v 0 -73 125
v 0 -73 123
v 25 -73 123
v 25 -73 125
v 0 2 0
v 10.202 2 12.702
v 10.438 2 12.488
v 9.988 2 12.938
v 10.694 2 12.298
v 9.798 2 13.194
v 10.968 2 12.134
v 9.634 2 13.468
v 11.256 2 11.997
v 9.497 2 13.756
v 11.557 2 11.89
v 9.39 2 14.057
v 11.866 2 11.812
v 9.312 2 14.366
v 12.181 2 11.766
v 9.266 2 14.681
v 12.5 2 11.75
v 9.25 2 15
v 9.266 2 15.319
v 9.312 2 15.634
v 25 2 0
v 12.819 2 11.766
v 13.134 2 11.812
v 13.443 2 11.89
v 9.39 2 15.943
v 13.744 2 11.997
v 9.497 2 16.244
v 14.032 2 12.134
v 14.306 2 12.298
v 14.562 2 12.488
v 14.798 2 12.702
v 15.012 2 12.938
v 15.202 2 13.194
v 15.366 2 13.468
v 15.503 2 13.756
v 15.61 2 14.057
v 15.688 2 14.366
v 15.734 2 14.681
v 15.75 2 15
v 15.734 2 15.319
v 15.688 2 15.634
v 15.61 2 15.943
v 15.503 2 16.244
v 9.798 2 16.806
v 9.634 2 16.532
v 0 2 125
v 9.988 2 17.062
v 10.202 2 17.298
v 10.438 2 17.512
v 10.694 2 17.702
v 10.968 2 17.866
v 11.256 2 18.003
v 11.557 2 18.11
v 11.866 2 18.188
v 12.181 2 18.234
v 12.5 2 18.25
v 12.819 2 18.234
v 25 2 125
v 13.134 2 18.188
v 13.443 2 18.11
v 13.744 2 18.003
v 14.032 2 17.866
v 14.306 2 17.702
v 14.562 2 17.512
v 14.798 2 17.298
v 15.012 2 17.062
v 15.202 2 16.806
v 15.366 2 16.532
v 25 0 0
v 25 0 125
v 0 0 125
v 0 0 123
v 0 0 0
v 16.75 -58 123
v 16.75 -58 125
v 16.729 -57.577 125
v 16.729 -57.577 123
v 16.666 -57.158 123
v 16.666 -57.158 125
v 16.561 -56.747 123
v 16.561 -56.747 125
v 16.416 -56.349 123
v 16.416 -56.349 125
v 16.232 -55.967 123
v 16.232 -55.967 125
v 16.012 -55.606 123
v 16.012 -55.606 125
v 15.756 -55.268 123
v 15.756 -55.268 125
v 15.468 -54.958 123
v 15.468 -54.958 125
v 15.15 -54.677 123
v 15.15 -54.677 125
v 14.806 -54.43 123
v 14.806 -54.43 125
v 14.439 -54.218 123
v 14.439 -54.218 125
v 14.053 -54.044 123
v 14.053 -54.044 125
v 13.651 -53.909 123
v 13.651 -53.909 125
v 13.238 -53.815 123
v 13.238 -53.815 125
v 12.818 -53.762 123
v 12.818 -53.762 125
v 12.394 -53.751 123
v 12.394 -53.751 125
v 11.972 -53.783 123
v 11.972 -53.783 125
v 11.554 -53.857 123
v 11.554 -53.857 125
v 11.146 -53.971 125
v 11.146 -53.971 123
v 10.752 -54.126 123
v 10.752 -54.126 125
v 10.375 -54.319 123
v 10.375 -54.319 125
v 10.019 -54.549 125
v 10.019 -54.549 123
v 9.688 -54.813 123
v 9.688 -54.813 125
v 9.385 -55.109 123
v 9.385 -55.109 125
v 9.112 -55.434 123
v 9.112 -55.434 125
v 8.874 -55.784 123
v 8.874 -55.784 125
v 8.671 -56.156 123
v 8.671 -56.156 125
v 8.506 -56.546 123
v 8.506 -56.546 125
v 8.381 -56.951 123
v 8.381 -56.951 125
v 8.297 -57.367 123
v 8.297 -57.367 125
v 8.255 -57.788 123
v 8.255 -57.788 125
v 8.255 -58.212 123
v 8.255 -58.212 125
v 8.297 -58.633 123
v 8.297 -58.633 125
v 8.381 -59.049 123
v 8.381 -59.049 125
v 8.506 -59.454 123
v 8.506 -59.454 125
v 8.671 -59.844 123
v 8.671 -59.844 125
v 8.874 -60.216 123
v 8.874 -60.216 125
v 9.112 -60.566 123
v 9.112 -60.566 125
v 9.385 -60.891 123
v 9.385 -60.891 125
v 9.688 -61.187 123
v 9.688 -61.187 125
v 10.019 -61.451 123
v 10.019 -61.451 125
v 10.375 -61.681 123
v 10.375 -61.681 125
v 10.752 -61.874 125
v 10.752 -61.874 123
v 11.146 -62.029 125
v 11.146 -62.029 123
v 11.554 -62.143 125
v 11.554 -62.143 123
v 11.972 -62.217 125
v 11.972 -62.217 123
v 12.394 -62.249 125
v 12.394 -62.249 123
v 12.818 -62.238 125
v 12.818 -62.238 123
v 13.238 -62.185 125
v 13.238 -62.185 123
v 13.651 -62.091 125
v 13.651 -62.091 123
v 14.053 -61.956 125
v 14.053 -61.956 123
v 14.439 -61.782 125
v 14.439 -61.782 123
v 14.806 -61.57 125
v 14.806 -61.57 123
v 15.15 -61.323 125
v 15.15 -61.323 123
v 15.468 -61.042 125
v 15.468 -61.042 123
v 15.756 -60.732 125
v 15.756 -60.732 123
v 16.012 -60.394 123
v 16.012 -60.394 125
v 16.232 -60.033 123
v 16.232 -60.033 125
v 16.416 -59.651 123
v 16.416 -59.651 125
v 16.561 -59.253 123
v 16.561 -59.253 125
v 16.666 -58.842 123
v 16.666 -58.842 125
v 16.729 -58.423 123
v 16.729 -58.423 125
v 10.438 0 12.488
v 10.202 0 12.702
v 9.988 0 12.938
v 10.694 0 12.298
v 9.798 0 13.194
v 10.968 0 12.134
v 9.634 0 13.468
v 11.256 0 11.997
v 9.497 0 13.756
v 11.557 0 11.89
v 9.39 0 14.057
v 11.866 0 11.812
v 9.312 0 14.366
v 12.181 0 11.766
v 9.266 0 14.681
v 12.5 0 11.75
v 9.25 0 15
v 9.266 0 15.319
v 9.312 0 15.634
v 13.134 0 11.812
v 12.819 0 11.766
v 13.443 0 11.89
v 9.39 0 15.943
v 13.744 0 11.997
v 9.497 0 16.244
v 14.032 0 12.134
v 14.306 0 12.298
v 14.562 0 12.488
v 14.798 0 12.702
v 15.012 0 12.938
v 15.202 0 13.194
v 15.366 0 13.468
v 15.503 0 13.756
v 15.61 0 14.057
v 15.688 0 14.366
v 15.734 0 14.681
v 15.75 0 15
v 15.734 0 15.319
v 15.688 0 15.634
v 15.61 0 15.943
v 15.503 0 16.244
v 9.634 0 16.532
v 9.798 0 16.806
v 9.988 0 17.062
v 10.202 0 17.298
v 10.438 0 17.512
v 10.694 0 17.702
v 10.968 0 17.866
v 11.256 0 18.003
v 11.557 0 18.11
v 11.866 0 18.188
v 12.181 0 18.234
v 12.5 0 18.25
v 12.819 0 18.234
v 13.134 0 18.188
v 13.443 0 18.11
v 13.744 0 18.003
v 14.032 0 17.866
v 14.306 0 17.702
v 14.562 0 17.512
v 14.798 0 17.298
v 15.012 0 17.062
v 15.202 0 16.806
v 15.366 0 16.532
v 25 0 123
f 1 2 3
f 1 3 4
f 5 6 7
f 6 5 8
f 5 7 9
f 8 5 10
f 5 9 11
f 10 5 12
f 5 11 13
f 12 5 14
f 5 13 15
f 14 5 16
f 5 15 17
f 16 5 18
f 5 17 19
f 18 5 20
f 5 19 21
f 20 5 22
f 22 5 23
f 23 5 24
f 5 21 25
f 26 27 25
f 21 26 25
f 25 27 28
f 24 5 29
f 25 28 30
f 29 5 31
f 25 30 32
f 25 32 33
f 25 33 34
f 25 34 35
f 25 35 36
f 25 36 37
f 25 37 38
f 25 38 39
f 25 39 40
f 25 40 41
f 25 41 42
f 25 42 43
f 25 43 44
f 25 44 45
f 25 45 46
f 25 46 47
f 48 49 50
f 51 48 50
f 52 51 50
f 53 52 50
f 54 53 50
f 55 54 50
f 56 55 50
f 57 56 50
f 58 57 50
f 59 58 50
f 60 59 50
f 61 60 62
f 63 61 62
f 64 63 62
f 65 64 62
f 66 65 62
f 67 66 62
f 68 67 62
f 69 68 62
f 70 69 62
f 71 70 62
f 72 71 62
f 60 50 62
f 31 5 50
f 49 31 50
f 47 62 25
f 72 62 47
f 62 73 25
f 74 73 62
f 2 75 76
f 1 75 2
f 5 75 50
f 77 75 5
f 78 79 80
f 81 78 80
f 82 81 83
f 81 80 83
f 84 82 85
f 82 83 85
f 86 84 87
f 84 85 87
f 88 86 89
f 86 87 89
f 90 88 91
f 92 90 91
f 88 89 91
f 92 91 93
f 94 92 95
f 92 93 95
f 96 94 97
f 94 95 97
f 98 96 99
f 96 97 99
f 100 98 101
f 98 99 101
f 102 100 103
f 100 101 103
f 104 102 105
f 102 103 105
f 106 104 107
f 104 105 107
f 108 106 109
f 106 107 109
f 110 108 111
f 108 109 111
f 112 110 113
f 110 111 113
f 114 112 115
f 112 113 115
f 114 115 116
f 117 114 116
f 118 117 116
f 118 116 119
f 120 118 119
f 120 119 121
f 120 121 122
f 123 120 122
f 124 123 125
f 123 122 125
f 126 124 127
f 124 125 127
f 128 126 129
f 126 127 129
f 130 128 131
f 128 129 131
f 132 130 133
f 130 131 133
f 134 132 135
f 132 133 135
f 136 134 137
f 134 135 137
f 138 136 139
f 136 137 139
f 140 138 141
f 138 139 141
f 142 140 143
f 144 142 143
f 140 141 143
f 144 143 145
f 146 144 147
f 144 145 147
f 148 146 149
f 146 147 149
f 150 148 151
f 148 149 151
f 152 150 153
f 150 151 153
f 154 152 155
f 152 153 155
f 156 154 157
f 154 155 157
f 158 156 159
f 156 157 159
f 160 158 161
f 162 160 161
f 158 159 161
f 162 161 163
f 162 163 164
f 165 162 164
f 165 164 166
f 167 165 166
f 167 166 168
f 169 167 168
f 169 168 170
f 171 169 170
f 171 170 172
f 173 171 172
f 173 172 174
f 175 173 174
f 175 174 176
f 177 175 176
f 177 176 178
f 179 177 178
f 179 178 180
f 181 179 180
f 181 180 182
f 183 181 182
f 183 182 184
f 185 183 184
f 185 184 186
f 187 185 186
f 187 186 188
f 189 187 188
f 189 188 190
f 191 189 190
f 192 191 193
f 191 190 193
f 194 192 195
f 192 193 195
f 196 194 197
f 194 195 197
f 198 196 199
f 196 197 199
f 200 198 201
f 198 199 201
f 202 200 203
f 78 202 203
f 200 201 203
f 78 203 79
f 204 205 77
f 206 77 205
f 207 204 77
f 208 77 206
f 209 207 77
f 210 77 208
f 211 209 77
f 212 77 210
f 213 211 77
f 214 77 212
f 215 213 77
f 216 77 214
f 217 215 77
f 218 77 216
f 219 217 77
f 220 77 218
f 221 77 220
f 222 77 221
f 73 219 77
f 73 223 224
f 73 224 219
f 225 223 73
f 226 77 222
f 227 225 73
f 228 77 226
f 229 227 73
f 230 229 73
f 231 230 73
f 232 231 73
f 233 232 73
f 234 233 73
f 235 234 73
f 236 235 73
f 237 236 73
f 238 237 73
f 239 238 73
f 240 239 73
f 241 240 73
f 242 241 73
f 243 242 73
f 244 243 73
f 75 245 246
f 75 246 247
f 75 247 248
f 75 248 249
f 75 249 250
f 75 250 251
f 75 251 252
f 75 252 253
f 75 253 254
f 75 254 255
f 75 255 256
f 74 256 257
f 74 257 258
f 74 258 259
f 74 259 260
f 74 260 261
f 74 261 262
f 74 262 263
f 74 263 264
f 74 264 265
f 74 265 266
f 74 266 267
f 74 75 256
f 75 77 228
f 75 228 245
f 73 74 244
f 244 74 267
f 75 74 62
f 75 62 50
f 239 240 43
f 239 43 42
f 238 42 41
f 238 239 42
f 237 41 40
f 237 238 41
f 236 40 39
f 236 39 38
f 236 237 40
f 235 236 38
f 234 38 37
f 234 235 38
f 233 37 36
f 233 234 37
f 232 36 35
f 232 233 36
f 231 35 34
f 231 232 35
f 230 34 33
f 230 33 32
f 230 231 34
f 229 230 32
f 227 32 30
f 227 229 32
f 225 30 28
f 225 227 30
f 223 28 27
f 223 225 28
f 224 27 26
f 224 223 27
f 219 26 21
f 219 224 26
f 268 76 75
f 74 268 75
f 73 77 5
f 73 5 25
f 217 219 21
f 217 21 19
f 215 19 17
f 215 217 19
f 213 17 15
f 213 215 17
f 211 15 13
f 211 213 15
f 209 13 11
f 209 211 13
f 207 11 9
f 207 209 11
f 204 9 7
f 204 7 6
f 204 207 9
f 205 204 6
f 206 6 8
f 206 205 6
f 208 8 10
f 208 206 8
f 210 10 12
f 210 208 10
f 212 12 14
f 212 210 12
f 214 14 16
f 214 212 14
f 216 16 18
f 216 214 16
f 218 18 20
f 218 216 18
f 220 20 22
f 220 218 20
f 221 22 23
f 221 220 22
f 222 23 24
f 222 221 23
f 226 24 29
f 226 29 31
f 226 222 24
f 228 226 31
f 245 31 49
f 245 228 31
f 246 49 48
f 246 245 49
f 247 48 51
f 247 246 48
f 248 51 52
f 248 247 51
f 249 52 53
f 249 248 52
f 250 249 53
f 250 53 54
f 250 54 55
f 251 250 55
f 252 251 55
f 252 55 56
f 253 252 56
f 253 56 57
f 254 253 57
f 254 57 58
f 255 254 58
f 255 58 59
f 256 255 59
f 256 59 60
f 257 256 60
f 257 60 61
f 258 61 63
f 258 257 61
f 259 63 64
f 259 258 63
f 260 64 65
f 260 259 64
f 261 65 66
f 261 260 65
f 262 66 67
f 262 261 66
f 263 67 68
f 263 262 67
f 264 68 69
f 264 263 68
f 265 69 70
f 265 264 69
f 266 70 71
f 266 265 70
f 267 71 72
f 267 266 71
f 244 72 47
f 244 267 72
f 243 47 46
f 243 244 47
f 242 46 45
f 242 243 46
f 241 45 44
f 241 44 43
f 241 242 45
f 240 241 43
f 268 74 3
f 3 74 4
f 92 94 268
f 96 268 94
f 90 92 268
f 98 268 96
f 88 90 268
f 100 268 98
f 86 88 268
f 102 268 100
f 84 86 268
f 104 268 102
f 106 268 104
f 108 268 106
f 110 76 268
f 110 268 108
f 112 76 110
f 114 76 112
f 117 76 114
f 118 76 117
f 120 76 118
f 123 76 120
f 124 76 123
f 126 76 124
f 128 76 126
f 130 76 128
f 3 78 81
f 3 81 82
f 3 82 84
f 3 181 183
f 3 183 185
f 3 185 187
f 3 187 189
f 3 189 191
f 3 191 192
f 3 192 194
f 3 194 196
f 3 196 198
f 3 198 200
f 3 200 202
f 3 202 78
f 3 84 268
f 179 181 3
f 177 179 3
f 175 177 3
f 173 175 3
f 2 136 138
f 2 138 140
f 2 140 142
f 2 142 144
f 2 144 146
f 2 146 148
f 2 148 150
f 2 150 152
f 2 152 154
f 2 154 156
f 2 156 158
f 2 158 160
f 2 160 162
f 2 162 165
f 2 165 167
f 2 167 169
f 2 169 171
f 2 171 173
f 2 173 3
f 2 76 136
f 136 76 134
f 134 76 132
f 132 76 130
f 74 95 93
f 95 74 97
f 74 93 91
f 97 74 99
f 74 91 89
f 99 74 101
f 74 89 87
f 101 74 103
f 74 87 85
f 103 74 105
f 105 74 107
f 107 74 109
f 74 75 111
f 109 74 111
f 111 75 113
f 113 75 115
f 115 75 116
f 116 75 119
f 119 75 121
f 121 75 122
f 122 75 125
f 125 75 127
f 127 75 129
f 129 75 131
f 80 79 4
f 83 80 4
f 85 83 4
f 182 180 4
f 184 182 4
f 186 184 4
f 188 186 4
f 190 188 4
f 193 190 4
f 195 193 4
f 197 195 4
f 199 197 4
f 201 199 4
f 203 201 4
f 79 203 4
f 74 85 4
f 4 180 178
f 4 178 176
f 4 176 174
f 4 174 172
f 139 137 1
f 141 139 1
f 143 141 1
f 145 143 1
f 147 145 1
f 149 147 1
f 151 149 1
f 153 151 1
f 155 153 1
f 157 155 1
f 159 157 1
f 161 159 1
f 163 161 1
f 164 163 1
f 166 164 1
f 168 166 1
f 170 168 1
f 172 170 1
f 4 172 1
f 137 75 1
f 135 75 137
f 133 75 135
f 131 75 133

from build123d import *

# Parameters (mm, degrees)
F1_DEPTH = 2
F2_W     = 73
F2_H     = 2
F3_DEPTH = 25
F4_R     = 4.25
F5_DEPTH = 2


with BuildPart() as f1:
    # F0 (on Front) → F1 (new body)
    with BuildSketch(Plane.XZ):
        with BuildLine():
            ThreePointArc((15.75, 15), (10.201903, 17.298097), (12.5, 11.75))
            ThreePointArc((12.5, 11.75), (14.798097, 12.701903), (15.75, 15))
        make_face()
        Polygon((0, 125), (0, 0), (12.5, 0), (25, 0), (25, 125), align=None)
        with BuildLine():
            ThreePointArc((15.75, 15), (14.798097, 12.701903), (12.5, 11.75))
            ThreePointArc((12.5, 11.75), (10.201903, 17.298097), (15.75, 15))
        make_face(mode=Mode.SUBTRACT)
    extrude(amount=-F1_DEPTH)


with BuildPart() as f3:
    # F2 (on face) → F3 (new body)
    with BuildSketch(Plane(origin=(0, 0, 0), x_dir=(0, -1, 0), z_dir=(-1, 0, 0))):
        with Locations((36.5, 124)):
            Rectangle(F2_W, F2_H)
    extrude(amount=-F3_DEPTH)

    # F4 (on face) → F5 (cut)
    with BuildSketch(Plane.XY.offset(125)):
        with Locations((12.5, -58)):
            Circle(F4_R)
    extrude(amount=-F5_DEPTH, mode=Mode.SUBTRACT)


solid = Compound([f1.part, f3.part])
